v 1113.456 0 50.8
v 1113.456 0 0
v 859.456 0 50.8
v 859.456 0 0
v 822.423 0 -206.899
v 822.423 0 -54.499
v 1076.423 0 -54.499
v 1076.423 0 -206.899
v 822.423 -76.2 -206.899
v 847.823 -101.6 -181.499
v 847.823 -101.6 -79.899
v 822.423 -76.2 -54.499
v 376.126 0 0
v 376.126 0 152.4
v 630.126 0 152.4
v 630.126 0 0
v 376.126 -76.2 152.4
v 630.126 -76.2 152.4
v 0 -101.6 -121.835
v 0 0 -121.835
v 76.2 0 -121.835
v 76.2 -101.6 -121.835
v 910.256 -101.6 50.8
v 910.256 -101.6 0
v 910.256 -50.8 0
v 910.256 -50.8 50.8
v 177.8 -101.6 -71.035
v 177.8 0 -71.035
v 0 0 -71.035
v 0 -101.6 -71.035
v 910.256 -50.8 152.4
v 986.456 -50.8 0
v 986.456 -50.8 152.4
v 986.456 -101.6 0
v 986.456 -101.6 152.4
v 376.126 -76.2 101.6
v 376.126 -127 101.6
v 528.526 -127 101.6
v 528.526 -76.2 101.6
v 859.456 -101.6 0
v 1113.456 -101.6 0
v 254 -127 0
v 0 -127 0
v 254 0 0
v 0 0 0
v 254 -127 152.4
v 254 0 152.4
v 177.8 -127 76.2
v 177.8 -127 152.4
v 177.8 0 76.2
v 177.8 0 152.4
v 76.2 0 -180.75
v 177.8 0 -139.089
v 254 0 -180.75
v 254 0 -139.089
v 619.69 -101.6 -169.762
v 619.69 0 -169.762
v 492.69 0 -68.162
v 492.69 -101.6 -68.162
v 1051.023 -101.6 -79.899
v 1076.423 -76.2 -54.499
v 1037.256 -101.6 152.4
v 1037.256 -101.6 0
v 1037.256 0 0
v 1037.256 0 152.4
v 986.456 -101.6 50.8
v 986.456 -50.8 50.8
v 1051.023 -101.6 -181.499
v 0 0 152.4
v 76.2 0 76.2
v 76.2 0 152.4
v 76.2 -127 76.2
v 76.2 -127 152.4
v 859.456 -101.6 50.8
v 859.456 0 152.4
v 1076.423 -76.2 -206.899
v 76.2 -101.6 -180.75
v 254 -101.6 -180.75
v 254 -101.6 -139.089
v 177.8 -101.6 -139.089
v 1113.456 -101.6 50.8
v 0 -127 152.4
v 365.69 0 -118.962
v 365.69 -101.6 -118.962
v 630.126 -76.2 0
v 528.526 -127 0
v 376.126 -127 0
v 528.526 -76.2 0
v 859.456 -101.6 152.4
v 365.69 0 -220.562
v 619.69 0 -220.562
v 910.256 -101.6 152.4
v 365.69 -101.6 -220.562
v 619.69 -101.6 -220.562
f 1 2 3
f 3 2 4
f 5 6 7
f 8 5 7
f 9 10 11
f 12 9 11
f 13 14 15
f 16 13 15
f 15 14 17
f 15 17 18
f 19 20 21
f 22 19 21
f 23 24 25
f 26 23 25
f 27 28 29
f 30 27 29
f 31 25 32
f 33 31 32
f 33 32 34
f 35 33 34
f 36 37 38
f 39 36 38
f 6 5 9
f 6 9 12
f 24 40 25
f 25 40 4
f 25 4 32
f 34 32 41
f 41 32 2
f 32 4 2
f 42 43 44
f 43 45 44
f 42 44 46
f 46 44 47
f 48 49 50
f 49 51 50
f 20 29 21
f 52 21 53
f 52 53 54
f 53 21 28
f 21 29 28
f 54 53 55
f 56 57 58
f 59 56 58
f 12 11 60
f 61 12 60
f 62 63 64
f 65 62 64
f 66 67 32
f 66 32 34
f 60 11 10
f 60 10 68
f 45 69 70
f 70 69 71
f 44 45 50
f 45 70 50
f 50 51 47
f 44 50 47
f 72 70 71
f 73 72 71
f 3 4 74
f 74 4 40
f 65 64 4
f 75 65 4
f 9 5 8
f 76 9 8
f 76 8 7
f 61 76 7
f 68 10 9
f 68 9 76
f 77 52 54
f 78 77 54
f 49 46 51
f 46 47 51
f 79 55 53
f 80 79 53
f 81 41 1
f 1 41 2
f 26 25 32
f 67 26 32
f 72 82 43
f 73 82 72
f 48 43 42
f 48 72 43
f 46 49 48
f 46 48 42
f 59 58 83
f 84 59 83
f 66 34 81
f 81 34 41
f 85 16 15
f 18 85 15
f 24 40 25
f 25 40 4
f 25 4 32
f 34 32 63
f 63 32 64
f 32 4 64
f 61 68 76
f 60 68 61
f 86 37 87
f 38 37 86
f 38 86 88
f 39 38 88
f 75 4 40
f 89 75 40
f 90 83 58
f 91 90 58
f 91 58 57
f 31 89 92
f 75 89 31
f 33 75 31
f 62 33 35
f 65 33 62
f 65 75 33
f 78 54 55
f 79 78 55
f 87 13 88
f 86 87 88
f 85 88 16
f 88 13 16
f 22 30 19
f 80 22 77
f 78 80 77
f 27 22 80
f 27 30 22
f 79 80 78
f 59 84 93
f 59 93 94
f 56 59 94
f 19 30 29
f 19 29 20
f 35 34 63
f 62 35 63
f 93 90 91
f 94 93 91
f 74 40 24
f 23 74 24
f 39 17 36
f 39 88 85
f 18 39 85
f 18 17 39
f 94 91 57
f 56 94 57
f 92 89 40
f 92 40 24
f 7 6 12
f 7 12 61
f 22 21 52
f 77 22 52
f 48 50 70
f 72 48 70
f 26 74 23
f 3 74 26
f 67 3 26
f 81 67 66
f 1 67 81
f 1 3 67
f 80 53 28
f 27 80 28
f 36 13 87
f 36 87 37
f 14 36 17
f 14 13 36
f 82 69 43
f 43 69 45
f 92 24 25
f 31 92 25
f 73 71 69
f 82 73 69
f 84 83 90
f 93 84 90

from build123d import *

# Parameters (mm, degrees)
F2_DEPTH  = 25.4
F3_W      = 254
F3_H      = 152.4
F4_DEPTH  = 25.4
F5_DEPTH  = 101.6
F6_DEPTH  = 101.6
F7_W      = 101.6
F7_H      = 50.8
F8_DEPTH  = 152.4
F9_W      = 152.4
F9_H      = 50.8
F10_DEPTH = 50.8
F12_DEPTH = 152.4
F11_W     = 76.2
F11_H     = 101.6
F13_DEPTH = 50.8
F15_DEPTH = 101.6
F17_DEPTH = 101.6
F18_W     = 254
F18_H     = 152.4
F19_DEPTH = 101.6
F20_SIZE  = 25.4


with BuildPart() as f2:
    # F1 (on face) → F2 (new body)
    with BuildSketch(Plane.XZ):
        Polygon((76.2, 152.4), (0, 152.4), (0, 0), (254, 0), (254, 152.4), (177.8, 152.4), (177.8, 76.2), (76.2, 76.2), align=None)
    extrude(amount=F2_DEPTH)

    # F5 (add): a face of the model
    f5_faces = [f2.faces().sort_by_distance(p)[0] for p in [
        (127, -25.4, 66.675),
    ]]
    extrude(f5_faces, amount=F5_DEPTH)


with BuildPart() as f4:
    # F3 (on Front) → F4 (new body)
    with BuildSketch(Plane.XZ):
        with Locations((503.1259218282, 76.2)):
            Rectangle(F3_W, F3_H)
    extrude(amount=F4_DEPTH)

    # F6 (add): a face of the model
    f6_faces = [f4.faces().sort_by_distance(p)[0] for p in [
        (503.1259218282, -25.4, 76.2),
    ]]
    extrude(f6_faces, amount=F6_DEPTH)

    # F7 (on face) → F8 (cut)
    with BuildSketch(Plane.XY.offset(152.4)):
        with Locations((579.3259218282, -101.6)):
            Rectangle(F7_W, F7_H)
    extrude(amount=-F8_DEPTH, mode=Mode.SUBTRACT)

    # F9 (on face) → F10 (cut)
    with BuildSketch(Plane.XZ.offset(127)):
        with Locations((452.3259218282, 127)):
            Rectangle(F9_W, F9_H)
    extrude(amount=-F10_DEPTH, mode=Mode.SUBTRACT)


with BuildPart() as f12:
    # F11 (on Top) → F12 (new body)
    with BuildSketch(Plane.XY):
        Polygon((1037.2558647942, 0), (859.4558647942, 0), (859.4558647942, -101.6), (910.2558647942, -101.6), (910.2558647942, -50.8), (986.4558647942, -50.8), (986.4558647942, -101.6), (1037.2558647942, -101.6), align=None)
    extrude(amount=F12_DEPTH)


with BuildPart() as f13:
    # F11 (on Top) → F13 (new body)
    with BuildSketch(Plane.XY):
        Polygon((1037.2558647942, 0), (859.4558647942, 0), (859.4558647942, -101.6), (910.2558647942, -101.6), (910.2558647942, -50.8), (986.4558647942, -50.8), (986.4558647942, -101.6), (1037.2558647942, -101.6), align=None)
        with Locations((1075.3558647942, -50.8)):
            Rectangle(F11_W, F11_H)
    extrude(amount=F13_DEPTH)


with BuildPart() as f15:
    # F14 (on Front) → F15 (new body)
    with BuildSketch(Plane.XZ):
        Polygon((177.8, -71.0350205056), (0, -71.0350205056), (0, -121.8350205056), (76.2, -121.8350205056), (76.2, -180.7503772258), (254, -180.7503772258), (254, -139.0888045003), (177.8, -139.0888045003), align=None)
    extrude(amount=F15_DEPTH)


with BuildPart() as f17:
    # F16 (on Front) → F17 (new body)
    with BuildSketch(Plane.XZ):
        Polygon((365.6903495645, -118.9615701005), (365.6903495645, -220.5615701005), (619.6903495645, -220.5615701005), (619.6903495645, -169.7615701005), (492.6903495645, -68.1615701005), align=None)
    extrude(amount=F17_DEPTH)


with BuildPart() as f19:
    # F18 (on Front) → F19 (new body)
    with BuildSketch(Plane.XZ):
        with Locations((949.4231004715, -130.6987637758)):
            Rectangle(F18_W, F18_H)
    extrude(amount=F19_DEPTH)

    # F20
    f20_edges = [f19.edges().sort_by_distance(p)[0] for p in [
        (822.4231, -101.6, -130.698764),
        (949.4231, -101.6, -206.898764),
        (1076.4231, -101.6, -130.698764),
        (949.4231, -101.6, -54.498764),
    ]]
    chamfer(f20_edges, length=F20_SIZE)


solid = Compound([f2.part, f4.part, f12.part, f13.part, f15.part, f17.part, f19.part])
